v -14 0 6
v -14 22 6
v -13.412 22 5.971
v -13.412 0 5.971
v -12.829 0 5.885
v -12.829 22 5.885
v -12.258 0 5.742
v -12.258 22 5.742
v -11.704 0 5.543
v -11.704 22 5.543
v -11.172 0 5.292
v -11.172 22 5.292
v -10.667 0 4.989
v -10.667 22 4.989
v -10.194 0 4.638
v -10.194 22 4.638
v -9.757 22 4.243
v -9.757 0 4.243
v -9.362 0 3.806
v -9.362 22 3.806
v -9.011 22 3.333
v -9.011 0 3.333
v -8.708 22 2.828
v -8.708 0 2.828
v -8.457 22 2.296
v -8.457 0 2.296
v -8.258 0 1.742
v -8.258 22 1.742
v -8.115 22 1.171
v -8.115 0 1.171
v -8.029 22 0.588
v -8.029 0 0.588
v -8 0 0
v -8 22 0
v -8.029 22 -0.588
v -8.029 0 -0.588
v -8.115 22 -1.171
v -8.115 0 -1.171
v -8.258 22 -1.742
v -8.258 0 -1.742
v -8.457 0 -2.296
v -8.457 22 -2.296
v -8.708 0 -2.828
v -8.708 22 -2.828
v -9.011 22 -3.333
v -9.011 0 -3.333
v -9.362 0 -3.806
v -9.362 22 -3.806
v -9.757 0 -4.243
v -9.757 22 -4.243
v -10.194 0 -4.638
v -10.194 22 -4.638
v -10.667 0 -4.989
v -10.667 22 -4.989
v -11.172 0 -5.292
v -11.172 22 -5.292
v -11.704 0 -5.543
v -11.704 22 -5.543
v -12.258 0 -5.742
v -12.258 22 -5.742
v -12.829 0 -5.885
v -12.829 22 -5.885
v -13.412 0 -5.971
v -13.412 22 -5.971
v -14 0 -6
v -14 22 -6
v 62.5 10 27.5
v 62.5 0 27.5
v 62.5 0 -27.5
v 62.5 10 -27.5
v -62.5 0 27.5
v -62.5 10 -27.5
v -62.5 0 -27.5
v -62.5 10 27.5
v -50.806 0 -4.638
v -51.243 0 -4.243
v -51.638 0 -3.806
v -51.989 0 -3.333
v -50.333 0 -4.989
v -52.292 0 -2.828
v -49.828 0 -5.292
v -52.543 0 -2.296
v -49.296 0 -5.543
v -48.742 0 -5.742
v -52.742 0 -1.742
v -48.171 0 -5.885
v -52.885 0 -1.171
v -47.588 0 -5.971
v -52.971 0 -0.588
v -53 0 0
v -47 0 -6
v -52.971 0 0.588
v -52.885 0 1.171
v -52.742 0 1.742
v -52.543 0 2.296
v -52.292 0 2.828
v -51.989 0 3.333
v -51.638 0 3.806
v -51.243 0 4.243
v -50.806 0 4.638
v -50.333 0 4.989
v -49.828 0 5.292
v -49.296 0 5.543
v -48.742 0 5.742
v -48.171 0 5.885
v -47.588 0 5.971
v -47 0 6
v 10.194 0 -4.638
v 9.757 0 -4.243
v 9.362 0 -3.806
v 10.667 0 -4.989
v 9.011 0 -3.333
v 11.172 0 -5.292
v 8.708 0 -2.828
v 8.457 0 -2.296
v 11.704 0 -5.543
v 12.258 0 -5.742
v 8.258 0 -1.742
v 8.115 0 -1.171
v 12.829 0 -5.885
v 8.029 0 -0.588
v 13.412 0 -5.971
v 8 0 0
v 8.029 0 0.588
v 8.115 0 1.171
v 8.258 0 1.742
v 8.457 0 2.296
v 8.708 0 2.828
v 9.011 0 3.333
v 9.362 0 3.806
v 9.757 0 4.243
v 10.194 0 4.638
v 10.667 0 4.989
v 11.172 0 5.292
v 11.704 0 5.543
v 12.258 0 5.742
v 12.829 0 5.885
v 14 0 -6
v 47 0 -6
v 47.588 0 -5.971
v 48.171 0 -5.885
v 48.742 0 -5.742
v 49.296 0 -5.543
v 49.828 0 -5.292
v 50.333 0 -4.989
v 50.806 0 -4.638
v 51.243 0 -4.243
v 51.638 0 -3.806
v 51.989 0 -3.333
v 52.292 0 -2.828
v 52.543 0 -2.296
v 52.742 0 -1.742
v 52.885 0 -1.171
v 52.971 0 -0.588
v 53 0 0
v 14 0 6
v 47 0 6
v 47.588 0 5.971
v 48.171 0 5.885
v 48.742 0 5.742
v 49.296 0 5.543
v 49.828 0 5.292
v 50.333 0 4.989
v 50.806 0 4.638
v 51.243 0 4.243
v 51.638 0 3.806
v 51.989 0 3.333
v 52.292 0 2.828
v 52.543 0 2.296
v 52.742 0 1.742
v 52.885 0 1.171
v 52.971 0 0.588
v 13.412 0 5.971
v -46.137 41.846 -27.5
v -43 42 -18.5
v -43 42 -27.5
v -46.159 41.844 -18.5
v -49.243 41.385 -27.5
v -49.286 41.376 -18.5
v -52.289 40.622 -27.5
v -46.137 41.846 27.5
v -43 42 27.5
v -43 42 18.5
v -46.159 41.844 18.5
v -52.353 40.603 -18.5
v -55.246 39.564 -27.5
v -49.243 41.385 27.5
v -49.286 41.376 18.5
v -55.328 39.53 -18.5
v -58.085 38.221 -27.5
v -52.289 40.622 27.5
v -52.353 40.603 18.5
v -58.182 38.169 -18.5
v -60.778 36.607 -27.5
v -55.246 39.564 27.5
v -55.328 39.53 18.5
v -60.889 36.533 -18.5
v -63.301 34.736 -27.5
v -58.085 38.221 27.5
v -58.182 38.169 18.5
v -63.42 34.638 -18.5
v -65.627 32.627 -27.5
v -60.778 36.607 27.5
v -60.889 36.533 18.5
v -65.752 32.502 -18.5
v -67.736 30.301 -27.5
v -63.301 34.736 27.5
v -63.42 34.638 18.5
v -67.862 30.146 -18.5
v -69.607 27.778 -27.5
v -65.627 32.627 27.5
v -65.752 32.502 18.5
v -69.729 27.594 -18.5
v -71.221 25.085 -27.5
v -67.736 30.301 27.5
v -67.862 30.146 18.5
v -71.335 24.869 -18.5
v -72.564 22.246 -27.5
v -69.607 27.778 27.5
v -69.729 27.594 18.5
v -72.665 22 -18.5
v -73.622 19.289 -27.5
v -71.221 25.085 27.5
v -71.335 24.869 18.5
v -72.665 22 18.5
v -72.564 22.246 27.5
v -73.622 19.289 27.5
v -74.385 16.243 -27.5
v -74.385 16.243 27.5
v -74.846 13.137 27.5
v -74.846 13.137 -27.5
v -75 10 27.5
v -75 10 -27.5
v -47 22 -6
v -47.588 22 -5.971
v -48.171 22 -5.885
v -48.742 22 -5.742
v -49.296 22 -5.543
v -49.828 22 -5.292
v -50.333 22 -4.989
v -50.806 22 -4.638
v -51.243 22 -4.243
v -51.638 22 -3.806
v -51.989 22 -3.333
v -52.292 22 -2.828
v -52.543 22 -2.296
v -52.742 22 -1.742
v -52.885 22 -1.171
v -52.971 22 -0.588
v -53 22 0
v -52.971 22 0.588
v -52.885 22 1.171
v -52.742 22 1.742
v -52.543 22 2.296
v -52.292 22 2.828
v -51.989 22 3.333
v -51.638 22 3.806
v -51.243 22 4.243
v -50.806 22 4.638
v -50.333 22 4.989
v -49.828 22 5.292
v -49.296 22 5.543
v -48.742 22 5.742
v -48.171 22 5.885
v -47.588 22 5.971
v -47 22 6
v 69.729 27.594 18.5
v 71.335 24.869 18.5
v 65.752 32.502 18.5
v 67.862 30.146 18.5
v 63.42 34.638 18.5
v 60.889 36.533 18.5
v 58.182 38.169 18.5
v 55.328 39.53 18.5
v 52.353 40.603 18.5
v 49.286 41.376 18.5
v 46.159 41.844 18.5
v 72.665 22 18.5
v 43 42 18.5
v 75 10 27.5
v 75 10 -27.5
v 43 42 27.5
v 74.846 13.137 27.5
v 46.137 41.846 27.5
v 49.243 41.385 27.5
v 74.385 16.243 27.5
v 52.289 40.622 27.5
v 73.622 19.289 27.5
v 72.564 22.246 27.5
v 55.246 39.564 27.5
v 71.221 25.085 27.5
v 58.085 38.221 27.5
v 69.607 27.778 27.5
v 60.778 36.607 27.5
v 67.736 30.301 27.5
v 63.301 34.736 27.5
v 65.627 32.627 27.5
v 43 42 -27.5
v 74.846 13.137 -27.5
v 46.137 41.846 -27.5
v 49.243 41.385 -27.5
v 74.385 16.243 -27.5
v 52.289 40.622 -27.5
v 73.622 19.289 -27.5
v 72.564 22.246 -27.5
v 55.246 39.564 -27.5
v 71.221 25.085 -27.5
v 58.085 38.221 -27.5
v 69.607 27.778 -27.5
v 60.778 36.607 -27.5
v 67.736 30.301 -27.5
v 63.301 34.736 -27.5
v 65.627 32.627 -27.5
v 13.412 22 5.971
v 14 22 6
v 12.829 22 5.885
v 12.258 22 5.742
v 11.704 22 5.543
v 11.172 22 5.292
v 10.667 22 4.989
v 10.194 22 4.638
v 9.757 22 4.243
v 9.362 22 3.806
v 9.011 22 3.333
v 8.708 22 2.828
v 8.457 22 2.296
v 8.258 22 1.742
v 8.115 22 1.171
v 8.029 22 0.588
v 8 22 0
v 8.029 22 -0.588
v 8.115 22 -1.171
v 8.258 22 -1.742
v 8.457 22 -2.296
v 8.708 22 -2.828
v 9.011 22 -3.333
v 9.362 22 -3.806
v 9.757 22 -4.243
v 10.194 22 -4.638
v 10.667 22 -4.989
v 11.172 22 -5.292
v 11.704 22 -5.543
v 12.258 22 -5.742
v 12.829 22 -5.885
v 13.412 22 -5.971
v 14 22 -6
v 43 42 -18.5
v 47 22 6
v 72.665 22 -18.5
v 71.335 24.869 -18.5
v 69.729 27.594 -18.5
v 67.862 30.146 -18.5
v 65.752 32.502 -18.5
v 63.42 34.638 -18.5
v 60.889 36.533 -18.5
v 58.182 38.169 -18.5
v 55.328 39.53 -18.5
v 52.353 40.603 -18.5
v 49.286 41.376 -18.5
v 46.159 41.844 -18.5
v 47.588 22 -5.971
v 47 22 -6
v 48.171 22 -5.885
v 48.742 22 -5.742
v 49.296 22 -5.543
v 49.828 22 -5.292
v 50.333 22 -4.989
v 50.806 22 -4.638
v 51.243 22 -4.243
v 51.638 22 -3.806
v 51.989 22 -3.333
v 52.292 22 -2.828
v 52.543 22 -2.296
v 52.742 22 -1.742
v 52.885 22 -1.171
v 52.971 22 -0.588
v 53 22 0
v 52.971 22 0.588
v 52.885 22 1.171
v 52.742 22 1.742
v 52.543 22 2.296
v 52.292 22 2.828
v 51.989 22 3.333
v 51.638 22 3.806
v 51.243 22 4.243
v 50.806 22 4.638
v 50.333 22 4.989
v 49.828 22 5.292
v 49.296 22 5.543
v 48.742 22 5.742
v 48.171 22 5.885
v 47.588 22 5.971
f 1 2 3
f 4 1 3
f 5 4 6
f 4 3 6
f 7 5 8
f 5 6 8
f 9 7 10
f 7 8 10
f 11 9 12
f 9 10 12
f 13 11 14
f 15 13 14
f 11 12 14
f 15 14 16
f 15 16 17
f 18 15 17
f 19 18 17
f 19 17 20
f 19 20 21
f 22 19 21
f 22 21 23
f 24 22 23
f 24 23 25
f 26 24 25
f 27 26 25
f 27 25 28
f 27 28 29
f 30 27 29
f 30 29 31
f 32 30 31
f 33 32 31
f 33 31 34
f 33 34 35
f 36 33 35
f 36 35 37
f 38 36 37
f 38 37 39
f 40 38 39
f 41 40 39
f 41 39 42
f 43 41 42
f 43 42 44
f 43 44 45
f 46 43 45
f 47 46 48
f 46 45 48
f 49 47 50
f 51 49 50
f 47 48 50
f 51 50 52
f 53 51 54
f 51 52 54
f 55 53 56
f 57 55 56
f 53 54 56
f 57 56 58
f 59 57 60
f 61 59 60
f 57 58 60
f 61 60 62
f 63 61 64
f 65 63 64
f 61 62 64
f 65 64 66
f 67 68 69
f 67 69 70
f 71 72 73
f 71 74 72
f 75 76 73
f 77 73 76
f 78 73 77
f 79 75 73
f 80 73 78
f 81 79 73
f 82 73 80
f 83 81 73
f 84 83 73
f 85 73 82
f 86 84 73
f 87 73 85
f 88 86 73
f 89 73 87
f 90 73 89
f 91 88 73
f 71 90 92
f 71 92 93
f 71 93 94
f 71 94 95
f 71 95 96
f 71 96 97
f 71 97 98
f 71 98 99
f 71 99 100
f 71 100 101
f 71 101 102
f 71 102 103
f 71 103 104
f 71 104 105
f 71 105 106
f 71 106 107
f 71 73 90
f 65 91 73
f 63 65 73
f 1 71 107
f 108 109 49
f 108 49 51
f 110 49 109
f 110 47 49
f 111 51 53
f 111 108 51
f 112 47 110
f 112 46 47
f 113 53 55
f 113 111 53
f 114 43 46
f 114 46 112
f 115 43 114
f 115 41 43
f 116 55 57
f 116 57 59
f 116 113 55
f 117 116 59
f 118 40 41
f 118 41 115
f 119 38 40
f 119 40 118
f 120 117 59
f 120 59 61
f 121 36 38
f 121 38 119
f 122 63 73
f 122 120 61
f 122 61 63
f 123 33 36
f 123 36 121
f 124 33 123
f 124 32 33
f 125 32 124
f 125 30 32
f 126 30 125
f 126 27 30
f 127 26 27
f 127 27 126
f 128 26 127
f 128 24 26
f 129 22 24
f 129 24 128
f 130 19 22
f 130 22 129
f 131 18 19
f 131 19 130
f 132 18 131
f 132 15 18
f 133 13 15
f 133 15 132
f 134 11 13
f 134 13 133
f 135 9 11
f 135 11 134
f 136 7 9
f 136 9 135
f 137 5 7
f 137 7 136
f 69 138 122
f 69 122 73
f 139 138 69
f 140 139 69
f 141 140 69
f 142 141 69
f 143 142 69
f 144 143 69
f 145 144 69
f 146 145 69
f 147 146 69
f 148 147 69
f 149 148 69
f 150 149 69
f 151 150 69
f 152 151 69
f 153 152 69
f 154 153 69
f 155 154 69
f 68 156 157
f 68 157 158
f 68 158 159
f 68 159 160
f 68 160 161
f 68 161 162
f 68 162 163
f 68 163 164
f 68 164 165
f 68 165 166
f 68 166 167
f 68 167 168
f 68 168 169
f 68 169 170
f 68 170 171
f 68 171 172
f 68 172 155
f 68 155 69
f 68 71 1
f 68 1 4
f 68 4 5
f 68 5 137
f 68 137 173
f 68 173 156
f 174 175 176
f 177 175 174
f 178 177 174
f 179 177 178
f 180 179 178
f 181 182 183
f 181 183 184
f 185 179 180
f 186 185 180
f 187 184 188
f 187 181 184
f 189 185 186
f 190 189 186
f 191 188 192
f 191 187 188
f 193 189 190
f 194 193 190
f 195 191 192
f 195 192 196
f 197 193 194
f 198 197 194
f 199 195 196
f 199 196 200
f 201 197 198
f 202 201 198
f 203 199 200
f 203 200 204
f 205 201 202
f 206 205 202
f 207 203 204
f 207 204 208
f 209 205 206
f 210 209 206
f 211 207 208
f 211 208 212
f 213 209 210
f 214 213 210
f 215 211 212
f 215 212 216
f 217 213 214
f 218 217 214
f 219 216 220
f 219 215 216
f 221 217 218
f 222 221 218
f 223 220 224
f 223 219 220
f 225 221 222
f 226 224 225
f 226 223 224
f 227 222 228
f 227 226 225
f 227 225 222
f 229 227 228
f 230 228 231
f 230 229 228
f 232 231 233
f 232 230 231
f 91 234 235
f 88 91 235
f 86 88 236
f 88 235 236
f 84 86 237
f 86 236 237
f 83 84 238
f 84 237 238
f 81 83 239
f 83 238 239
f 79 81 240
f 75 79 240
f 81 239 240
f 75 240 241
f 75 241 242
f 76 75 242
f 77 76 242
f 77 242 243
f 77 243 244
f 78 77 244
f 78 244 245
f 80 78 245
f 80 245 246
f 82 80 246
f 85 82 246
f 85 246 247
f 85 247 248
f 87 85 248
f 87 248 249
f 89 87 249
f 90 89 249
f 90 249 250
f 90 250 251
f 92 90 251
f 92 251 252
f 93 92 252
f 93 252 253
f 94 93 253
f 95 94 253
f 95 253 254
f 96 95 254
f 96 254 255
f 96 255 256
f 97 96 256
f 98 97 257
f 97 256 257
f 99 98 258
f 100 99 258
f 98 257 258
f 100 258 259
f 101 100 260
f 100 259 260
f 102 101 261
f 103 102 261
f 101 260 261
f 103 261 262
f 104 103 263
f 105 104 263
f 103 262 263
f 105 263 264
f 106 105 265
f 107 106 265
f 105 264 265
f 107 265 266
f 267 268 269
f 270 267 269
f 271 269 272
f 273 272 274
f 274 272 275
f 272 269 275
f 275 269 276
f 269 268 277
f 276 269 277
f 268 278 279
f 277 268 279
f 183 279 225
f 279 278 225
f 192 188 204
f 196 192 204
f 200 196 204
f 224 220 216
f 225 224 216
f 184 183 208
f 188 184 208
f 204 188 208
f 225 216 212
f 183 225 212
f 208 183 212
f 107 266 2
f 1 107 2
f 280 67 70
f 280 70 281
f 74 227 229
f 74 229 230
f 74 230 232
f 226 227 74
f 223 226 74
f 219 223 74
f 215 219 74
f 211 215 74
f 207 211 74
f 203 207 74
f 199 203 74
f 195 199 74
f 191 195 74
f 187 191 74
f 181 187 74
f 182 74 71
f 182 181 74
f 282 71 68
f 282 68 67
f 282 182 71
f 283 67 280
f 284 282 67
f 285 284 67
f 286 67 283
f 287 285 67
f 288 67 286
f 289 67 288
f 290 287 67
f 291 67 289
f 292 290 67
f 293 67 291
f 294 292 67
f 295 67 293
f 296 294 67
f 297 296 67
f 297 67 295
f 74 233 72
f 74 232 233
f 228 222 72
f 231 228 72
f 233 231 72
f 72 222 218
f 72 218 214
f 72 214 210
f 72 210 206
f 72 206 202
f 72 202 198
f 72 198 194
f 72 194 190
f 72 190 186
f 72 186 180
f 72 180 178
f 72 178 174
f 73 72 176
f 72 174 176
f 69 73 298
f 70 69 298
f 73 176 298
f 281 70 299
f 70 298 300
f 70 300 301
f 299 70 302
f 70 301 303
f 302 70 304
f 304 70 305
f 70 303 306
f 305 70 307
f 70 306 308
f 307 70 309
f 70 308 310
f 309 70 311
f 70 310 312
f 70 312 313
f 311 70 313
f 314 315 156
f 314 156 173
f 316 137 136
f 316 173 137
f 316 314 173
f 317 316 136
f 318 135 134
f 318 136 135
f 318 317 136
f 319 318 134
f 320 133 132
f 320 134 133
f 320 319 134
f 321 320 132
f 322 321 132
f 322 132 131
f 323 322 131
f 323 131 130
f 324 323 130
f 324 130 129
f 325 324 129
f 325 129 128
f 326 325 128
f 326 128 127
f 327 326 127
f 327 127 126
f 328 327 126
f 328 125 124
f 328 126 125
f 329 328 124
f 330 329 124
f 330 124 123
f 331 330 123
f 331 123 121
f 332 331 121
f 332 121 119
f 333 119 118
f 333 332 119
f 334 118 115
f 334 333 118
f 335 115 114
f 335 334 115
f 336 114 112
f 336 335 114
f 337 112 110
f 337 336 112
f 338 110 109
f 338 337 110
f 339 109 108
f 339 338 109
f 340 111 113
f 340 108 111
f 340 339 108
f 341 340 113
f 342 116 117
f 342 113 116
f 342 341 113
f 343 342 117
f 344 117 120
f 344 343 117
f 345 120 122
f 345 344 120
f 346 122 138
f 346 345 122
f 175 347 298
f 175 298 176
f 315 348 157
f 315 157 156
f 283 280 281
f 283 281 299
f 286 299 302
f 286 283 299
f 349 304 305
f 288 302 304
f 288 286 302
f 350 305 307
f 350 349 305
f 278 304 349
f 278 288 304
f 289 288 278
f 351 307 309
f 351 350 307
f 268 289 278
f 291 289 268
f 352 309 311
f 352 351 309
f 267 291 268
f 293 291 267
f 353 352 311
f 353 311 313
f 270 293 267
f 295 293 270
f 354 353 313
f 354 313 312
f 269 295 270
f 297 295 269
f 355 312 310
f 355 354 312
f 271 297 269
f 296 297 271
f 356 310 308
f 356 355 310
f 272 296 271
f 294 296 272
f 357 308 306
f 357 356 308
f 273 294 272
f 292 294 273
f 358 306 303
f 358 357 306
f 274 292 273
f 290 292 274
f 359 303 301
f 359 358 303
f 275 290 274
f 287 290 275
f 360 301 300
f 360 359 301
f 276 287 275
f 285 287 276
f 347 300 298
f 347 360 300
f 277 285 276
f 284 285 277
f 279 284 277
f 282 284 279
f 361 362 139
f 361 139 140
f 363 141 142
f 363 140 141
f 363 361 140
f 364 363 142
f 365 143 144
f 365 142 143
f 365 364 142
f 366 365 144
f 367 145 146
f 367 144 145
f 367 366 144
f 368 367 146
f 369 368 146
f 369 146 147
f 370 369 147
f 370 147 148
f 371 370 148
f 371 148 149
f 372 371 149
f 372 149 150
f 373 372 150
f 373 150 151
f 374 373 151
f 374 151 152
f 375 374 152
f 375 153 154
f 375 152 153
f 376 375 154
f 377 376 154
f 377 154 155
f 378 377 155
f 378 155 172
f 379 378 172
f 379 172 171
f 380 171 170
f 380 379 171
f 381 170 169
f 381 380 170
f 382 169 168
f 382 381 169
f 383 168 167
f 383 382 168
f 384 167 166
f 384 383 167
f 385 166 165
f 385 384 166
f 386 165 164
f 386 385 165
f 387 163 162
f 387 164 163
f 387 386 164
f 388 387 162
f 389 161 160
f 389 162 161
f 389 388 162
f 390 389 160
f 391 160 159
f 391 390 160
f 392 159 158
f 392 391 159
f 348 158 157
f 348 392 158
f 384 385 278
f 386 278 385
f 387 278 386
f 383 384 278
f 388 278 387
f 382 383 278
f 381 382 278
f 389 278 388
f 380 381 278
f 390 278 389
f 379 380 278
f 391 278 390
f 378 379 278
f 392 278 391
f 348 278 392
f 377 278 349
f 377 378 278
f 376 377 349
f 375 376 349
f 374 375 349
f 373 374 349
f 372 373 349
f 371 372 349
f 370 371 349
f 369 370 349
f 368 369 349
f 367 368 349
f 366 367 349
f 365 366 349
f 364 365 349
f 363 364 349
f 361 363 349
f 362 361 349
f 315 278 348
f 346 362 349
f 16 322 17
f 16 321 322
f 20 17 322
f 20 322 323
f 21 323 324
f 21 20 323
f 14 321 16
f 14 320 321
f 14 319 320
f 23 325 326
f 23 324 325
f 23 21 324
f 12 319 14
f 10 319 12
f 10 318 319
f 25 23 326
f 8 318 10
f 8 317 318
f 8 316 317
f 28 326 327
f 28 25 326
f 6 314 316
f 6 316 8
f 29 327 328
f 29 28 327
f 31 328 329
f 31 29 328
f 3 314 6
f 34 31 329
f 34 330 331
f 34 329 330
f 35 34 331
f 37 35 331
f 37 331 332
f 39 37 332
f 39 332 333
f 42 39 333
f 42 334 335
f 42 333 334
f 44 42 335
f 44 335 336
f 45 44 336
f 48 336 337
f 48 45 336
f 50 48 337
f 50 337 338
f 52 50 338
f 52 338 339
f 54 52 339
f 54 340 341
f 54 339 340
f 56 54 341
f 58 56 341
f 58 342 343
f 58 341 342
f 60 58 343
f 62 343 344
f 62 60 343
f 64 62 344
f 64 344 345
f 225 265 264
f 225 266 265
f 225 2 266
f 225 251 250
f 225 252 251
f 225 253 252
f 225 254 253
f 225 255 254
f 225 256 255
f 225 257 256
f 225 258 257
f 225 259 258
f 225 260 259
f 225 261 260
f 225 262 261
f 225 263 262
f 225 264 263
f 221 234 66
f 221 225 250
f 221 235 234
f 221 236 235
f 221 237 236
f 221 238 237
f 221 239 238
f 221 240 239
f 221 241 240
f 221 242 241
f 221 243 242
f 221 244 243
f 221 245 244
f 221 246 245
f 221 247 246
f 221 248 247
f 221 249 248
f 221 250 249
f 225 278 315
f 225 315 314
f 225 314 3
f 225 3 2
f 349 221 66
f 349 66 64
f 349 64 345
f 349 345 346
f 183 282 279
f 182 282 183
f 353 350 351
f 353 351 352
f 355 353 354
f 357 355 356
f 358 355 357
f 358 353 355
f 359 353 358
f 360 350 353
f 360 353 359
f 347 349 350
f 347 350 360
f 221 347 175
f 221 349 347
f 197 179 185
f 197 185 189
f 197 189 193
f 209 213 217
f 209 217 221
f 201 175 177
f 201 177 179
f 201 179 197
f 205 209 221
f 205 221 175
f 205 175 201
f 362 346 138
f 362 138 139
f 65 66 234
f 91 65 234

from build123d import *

# Parameters (mm, degrees)
BOSS_EXTRUDE1_DEPTH     = 27.5
CUT_EXTRUDE1_DEPTH      = 91.251038775
CUT_EXTRUDE1_DEPTH_BACK = 91.251038775
SKETCH3_W               = 37
SKETCH3_H               = 20
CUT_EXTRUDE2_REACH      = 92.251


with BuildPart() as part:
    # Sketch1 → Boss-Extrude1 (new, symmetric)
    with BuildSketch(Plane.XY):
        with BuildLine():
            Line((-62.5, 0), (62.5, 0))
            Line((62.5, 0), (62.5, 10))
            Line((62.5, 10), (75, 10))
            ThreePointArc((75, 10), (65.627416998, 32.627416998), (43, 42))
            Line((43, 42), (-43, 42))
            ThreePointArc((-43, 42), (-65.627416998, 32.627416998), (-75, 10))
            Line((-75, 10), (-62.5, 10))
            Line((-62.5, 10), (-62.5, 0))
        make_face()
    extrude(amount=BOSS_EXTRUDE1_DEPTH, both=True)

    # Sketch3 → Cut-Extrude1 (cut, two sides: drawn at the far end of the back side and taken through both)
    with BuildSketch(Plane(origin=(0, 0, 0), x_dir=(0, 0, -1), z_dir=(1, 0, 0)).offset(-CUT_EXTRUDE1_DEPTH_BACK)):
        with Locations((0, 32)):
            Rectangle(SKETCH3_W, SKETCH3_H)
    extrude(amount=CUT_EXTRUDE1_DEPTH + CUT_EXTRUDE1_DEPTH_BACK, mode=Mode.SUBTRACT)

    # Sketch2 → Cut-Extrude2 (cut, up to next)
    with BuildSketch(Plane(origin=(0, 42, 0), x_dir=(1, 0, 0), z_dir=(0, 1, 0)), mode=Mode.PRIVATE) as cut_extrude2_sk1:
        with BuildLine():
            Line((-14, 6), (-47, 6))
            ThreePointArc((-47, 6), (-53, 0), (-47, -6))
            Line((-47, -6), (-14, -6))
            ThreePointArc((-14, -6), (-8, 0), (-14, 6))
        make_face()
    cut_extrude2_tool1 = extrude(cut_extrude2_sk1.sketch, amount=-CUT_EXTRUDE2_REACH, mode=Mode.PRIVATE) & part.part
    # Sketch2 → Cut-Extrude2 (cut, up to next)
    with BuildSketch(Plane(origin=(0, 42, 0), x_dir=(1, 0, 0), z_dir=(0, 1, 0)), mode=Mode.PRIVATE) as cut_extrude2_sk2:
        with BuildLine():
            Line((14, 6), (47, 6))
            ThreePointArc((47, 6), (53, 0), (47, -6))
            Line((47, -6), (14, -6))
            ThreePointArc((14, -6), (8, 0), (14, 6))
        make_face()
    cut_extrude2_tool2 = extrude(cut_extrude2_sk2.sketch, amount=-CUT_EXTRUDE2_REACH, mode=Mode.PRIVATE) & part.part
    add(cut_extrude2_tool1.solids().sort_by_distance((-30.5, 42, 0))[0], mode=Mode.SUBTRACT)
    add(cut_extrude2_tool2.solids().sort_by_distance((30.5, 42, 0))[0], mode=Mode.SUBTRACT)


solid = part.part
